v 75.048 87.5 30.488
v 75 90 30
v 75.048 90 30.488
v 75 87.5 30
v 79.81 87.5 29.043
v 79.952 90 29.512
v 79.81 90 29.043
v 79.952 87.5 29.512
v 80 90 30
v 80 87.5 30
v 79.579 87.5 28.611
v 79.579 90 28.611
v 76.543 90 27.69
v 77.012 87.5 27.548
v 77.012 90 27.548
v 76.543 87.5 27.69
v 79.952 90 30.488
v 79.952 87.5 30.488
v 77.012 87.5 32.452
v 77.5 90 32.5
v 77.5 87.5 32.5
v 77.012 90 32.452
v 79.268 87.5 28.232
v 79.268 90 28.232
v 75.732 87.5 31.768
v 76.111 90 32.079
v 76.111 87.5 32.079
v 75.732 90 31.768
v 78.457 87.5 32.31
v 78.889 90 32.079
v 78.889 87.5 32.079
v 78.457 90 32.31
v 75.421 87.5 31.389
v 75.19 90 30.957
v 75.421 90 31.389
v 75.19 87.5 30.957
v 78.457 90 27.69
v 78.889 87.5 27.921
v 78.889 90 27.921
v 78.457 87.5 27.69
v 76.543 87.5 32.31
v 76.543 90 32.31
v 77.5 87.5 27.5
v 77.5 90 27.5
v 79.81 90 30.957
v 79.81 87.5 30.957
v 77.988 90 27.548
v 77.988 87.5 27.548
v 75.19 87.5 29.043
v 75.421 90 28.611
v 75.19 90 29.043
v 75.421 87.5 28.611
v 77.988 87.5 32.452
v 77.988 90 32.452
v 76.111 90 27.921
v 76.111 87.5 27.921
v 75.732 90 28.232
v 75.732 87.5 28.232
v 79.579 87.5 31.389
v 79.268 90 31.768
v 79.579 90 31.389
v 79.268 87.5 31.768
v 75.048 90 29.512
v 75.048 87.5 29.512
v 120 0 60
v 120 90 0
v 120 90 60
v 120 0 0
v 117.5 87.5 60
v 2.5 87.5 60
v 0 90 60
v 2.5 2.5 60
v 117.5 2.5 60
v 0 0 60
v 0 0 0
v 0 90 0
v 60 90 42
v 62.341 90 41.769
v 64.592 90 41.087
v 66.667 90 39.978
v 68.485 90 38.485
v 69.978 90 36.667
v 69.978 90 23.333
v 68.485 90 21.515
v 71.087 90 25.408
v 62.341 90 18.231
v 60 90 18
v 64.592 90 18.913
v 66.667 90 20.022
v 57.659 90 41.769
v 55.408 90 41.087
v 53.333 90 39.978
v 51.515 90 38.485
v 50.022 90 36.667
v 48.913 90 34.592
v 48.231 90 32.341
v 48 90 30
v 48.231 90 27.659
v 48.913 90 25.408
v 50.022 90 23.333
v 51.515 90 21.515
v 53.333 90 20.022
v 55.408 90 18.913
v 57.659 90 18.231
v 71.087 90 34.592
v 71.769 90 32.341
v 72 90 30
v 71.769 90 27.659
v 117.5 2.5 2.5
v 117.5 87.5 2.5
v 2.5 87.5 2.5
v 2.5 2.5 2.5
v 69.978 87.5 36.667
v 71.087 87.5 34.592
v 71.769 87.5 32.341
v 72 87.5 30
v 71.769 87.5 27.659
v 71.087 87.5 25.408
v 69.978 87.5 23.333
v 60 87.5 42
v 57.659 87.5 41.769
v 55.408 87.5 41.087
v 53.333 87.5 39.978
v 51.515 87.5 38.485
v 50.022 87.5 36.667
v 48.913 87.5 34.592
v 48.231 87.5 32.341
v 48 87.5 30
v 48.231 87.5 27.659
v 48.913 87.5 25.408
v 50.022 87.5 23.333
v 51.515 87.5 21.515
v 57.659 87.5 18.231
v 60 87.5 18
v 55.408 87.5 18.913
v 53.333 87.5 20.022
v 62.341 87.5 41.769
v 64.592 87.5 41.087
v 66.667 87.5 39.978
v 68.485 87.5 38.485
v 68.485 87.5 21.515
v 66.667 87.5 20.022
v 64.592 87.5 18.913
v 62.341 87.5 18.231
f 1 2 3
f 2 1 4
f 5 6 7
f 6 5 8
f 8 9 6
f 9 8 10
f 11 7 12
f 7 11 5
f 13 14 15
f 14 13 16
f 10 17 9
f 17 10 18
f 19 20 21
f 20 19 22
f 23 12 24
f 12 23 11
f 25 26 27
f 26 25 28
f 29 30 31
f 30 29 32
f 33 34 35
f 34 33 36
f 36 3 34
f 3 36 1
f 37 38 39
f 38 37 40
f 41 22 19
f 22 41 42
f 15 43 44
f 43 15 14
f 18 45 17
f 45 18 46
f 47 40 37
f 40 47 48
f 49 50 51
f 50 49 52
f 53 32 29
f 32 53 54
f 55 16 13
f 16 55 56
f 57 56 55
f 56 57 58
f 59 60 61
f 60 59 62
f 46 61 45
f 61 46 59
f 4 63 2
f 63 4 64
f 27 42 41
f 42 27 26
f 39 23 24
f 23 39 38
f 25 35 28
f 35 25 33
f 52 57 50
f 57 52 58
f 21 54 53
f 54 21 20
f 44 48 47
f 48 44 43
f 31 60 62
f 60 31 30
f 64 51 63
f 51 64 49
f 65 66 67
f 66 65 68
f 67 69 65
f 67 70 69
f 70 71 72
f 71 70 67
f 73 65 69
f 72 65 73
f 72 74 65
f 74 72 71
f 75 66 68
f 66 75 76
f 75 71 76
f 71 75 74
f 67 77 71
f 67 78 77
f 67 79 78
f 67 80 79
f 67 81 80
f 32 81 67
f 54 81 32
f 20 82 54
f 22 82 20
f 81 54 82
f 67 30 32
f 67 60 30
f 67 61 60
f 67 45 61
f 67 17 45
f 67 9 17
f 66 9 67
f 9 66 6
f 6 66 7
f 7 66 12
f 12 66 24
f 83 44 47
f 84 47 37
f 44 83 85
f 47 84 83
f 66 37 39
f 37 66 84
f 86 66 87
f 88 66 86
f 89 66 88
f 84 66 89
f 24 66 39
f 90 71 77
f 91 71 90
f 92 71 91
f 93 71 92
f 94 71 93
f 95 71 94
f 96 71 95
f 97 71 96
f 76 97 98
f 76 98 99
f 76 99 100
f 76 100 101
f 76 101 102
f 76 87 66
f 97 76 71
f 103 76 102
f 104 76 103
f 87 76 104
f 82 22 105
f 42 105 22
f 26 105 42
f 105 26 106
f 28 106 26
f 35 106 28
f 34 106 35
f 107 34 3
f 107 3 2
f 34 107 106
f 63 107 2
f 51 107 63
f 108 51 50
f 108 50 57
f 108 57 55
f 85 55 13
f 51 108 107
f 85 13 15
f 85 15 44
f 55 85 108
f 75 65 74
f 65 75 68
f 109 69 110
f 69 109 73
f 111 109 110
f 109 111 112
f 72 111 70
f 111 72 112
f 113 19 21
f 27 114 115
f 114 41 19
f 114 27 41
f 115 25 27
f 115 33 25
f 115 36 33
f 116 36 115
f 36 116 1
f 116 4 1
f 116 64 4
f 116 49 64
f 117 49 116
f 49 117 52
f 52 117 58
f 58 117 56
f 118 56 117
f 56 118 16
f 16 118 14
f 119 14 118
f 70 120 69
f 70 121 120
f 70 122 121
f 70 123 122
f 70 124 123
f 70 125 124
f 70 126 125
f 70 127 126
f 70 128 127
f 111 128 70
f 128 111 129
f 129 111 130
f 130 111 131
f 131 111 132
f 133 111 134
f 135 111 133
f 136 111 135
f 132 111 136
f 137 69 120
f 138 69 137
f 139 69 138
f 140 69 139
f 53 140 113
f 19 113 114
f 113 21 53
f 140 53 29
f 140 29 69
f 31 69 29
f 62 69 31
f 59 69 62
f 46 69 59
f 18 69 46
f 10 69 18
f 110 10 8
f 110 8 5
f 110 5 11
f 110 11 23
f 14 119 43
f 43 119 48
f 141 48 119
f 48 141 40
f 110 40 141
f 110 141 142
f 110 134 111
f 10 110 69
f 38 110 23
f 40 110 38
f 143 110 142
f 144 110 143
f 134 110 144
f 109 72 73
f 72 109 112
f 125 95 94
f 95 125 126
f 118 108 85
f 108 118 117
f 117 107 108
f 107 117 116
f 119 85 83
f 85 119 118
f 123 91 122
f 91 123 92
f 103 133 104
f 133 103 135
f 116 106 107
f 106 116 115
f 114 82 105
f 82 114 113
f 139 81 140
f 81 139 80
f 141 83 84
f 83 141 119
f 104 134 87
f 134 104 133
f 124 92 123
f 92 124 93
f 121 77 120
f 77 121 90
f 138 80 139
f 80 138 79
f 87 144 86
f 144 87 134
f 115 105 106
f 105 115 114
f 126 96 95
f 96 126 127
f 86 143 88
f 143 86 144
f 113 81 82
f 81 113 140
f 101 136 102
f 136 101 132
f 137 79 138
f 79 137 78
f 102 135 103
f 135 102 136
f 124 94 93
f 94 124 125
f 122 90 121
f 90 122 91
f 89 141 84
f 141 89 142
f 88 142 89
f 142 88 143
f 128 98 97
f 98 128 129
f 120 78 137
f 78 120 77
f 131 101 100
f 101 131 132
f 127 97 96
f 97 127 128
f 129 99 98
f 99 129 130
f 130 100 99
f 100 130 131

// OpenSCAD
$fn = 32;

// ----------------------------------------------------------------------
// Vent box: roundvent enclosure
// ----------------------------------------------------------------------

// --- parameters (mm) ---
box_l = 120;              // box length, X
box_w = 90;               // box width, Y
box_h = 60;               // box height, Z
wall_t = 2.5;             // shell wall thickness
vent_d = 24;              // central vent diameter
ring_d = 5;               // ring hole diameter
n_ring = 8;               // holes in the ring
ring_r = 17.5;            // ring radius

ring_step = 360 / n_ring;  // ring hole angular step

difference() {
  cube([box_l, box_w, box_h]);
  translate([wall_t, wall_t, wall_t])
    cube([box_l - 2 * wall_t, box_w - 2 * wall_t, box_h]);
  translate([box_l / 2, box_w - wall_t - 1, box_h / 2])
    rotate([-90, 0, 0]) cylinder(h = wall_t + 2, d = vent_d);
  for (i = [0 : n_ring - 1])
    translate([box_l / 2, box_w - wall_t - 1, box_h / 2])
      rotate([0, 0, i * ring_step])
        translate([ring_r, 0, 0]) rotate([-90, 0, 0])
          cylinder(h = wall_t + 2, d = ring_d);
}
